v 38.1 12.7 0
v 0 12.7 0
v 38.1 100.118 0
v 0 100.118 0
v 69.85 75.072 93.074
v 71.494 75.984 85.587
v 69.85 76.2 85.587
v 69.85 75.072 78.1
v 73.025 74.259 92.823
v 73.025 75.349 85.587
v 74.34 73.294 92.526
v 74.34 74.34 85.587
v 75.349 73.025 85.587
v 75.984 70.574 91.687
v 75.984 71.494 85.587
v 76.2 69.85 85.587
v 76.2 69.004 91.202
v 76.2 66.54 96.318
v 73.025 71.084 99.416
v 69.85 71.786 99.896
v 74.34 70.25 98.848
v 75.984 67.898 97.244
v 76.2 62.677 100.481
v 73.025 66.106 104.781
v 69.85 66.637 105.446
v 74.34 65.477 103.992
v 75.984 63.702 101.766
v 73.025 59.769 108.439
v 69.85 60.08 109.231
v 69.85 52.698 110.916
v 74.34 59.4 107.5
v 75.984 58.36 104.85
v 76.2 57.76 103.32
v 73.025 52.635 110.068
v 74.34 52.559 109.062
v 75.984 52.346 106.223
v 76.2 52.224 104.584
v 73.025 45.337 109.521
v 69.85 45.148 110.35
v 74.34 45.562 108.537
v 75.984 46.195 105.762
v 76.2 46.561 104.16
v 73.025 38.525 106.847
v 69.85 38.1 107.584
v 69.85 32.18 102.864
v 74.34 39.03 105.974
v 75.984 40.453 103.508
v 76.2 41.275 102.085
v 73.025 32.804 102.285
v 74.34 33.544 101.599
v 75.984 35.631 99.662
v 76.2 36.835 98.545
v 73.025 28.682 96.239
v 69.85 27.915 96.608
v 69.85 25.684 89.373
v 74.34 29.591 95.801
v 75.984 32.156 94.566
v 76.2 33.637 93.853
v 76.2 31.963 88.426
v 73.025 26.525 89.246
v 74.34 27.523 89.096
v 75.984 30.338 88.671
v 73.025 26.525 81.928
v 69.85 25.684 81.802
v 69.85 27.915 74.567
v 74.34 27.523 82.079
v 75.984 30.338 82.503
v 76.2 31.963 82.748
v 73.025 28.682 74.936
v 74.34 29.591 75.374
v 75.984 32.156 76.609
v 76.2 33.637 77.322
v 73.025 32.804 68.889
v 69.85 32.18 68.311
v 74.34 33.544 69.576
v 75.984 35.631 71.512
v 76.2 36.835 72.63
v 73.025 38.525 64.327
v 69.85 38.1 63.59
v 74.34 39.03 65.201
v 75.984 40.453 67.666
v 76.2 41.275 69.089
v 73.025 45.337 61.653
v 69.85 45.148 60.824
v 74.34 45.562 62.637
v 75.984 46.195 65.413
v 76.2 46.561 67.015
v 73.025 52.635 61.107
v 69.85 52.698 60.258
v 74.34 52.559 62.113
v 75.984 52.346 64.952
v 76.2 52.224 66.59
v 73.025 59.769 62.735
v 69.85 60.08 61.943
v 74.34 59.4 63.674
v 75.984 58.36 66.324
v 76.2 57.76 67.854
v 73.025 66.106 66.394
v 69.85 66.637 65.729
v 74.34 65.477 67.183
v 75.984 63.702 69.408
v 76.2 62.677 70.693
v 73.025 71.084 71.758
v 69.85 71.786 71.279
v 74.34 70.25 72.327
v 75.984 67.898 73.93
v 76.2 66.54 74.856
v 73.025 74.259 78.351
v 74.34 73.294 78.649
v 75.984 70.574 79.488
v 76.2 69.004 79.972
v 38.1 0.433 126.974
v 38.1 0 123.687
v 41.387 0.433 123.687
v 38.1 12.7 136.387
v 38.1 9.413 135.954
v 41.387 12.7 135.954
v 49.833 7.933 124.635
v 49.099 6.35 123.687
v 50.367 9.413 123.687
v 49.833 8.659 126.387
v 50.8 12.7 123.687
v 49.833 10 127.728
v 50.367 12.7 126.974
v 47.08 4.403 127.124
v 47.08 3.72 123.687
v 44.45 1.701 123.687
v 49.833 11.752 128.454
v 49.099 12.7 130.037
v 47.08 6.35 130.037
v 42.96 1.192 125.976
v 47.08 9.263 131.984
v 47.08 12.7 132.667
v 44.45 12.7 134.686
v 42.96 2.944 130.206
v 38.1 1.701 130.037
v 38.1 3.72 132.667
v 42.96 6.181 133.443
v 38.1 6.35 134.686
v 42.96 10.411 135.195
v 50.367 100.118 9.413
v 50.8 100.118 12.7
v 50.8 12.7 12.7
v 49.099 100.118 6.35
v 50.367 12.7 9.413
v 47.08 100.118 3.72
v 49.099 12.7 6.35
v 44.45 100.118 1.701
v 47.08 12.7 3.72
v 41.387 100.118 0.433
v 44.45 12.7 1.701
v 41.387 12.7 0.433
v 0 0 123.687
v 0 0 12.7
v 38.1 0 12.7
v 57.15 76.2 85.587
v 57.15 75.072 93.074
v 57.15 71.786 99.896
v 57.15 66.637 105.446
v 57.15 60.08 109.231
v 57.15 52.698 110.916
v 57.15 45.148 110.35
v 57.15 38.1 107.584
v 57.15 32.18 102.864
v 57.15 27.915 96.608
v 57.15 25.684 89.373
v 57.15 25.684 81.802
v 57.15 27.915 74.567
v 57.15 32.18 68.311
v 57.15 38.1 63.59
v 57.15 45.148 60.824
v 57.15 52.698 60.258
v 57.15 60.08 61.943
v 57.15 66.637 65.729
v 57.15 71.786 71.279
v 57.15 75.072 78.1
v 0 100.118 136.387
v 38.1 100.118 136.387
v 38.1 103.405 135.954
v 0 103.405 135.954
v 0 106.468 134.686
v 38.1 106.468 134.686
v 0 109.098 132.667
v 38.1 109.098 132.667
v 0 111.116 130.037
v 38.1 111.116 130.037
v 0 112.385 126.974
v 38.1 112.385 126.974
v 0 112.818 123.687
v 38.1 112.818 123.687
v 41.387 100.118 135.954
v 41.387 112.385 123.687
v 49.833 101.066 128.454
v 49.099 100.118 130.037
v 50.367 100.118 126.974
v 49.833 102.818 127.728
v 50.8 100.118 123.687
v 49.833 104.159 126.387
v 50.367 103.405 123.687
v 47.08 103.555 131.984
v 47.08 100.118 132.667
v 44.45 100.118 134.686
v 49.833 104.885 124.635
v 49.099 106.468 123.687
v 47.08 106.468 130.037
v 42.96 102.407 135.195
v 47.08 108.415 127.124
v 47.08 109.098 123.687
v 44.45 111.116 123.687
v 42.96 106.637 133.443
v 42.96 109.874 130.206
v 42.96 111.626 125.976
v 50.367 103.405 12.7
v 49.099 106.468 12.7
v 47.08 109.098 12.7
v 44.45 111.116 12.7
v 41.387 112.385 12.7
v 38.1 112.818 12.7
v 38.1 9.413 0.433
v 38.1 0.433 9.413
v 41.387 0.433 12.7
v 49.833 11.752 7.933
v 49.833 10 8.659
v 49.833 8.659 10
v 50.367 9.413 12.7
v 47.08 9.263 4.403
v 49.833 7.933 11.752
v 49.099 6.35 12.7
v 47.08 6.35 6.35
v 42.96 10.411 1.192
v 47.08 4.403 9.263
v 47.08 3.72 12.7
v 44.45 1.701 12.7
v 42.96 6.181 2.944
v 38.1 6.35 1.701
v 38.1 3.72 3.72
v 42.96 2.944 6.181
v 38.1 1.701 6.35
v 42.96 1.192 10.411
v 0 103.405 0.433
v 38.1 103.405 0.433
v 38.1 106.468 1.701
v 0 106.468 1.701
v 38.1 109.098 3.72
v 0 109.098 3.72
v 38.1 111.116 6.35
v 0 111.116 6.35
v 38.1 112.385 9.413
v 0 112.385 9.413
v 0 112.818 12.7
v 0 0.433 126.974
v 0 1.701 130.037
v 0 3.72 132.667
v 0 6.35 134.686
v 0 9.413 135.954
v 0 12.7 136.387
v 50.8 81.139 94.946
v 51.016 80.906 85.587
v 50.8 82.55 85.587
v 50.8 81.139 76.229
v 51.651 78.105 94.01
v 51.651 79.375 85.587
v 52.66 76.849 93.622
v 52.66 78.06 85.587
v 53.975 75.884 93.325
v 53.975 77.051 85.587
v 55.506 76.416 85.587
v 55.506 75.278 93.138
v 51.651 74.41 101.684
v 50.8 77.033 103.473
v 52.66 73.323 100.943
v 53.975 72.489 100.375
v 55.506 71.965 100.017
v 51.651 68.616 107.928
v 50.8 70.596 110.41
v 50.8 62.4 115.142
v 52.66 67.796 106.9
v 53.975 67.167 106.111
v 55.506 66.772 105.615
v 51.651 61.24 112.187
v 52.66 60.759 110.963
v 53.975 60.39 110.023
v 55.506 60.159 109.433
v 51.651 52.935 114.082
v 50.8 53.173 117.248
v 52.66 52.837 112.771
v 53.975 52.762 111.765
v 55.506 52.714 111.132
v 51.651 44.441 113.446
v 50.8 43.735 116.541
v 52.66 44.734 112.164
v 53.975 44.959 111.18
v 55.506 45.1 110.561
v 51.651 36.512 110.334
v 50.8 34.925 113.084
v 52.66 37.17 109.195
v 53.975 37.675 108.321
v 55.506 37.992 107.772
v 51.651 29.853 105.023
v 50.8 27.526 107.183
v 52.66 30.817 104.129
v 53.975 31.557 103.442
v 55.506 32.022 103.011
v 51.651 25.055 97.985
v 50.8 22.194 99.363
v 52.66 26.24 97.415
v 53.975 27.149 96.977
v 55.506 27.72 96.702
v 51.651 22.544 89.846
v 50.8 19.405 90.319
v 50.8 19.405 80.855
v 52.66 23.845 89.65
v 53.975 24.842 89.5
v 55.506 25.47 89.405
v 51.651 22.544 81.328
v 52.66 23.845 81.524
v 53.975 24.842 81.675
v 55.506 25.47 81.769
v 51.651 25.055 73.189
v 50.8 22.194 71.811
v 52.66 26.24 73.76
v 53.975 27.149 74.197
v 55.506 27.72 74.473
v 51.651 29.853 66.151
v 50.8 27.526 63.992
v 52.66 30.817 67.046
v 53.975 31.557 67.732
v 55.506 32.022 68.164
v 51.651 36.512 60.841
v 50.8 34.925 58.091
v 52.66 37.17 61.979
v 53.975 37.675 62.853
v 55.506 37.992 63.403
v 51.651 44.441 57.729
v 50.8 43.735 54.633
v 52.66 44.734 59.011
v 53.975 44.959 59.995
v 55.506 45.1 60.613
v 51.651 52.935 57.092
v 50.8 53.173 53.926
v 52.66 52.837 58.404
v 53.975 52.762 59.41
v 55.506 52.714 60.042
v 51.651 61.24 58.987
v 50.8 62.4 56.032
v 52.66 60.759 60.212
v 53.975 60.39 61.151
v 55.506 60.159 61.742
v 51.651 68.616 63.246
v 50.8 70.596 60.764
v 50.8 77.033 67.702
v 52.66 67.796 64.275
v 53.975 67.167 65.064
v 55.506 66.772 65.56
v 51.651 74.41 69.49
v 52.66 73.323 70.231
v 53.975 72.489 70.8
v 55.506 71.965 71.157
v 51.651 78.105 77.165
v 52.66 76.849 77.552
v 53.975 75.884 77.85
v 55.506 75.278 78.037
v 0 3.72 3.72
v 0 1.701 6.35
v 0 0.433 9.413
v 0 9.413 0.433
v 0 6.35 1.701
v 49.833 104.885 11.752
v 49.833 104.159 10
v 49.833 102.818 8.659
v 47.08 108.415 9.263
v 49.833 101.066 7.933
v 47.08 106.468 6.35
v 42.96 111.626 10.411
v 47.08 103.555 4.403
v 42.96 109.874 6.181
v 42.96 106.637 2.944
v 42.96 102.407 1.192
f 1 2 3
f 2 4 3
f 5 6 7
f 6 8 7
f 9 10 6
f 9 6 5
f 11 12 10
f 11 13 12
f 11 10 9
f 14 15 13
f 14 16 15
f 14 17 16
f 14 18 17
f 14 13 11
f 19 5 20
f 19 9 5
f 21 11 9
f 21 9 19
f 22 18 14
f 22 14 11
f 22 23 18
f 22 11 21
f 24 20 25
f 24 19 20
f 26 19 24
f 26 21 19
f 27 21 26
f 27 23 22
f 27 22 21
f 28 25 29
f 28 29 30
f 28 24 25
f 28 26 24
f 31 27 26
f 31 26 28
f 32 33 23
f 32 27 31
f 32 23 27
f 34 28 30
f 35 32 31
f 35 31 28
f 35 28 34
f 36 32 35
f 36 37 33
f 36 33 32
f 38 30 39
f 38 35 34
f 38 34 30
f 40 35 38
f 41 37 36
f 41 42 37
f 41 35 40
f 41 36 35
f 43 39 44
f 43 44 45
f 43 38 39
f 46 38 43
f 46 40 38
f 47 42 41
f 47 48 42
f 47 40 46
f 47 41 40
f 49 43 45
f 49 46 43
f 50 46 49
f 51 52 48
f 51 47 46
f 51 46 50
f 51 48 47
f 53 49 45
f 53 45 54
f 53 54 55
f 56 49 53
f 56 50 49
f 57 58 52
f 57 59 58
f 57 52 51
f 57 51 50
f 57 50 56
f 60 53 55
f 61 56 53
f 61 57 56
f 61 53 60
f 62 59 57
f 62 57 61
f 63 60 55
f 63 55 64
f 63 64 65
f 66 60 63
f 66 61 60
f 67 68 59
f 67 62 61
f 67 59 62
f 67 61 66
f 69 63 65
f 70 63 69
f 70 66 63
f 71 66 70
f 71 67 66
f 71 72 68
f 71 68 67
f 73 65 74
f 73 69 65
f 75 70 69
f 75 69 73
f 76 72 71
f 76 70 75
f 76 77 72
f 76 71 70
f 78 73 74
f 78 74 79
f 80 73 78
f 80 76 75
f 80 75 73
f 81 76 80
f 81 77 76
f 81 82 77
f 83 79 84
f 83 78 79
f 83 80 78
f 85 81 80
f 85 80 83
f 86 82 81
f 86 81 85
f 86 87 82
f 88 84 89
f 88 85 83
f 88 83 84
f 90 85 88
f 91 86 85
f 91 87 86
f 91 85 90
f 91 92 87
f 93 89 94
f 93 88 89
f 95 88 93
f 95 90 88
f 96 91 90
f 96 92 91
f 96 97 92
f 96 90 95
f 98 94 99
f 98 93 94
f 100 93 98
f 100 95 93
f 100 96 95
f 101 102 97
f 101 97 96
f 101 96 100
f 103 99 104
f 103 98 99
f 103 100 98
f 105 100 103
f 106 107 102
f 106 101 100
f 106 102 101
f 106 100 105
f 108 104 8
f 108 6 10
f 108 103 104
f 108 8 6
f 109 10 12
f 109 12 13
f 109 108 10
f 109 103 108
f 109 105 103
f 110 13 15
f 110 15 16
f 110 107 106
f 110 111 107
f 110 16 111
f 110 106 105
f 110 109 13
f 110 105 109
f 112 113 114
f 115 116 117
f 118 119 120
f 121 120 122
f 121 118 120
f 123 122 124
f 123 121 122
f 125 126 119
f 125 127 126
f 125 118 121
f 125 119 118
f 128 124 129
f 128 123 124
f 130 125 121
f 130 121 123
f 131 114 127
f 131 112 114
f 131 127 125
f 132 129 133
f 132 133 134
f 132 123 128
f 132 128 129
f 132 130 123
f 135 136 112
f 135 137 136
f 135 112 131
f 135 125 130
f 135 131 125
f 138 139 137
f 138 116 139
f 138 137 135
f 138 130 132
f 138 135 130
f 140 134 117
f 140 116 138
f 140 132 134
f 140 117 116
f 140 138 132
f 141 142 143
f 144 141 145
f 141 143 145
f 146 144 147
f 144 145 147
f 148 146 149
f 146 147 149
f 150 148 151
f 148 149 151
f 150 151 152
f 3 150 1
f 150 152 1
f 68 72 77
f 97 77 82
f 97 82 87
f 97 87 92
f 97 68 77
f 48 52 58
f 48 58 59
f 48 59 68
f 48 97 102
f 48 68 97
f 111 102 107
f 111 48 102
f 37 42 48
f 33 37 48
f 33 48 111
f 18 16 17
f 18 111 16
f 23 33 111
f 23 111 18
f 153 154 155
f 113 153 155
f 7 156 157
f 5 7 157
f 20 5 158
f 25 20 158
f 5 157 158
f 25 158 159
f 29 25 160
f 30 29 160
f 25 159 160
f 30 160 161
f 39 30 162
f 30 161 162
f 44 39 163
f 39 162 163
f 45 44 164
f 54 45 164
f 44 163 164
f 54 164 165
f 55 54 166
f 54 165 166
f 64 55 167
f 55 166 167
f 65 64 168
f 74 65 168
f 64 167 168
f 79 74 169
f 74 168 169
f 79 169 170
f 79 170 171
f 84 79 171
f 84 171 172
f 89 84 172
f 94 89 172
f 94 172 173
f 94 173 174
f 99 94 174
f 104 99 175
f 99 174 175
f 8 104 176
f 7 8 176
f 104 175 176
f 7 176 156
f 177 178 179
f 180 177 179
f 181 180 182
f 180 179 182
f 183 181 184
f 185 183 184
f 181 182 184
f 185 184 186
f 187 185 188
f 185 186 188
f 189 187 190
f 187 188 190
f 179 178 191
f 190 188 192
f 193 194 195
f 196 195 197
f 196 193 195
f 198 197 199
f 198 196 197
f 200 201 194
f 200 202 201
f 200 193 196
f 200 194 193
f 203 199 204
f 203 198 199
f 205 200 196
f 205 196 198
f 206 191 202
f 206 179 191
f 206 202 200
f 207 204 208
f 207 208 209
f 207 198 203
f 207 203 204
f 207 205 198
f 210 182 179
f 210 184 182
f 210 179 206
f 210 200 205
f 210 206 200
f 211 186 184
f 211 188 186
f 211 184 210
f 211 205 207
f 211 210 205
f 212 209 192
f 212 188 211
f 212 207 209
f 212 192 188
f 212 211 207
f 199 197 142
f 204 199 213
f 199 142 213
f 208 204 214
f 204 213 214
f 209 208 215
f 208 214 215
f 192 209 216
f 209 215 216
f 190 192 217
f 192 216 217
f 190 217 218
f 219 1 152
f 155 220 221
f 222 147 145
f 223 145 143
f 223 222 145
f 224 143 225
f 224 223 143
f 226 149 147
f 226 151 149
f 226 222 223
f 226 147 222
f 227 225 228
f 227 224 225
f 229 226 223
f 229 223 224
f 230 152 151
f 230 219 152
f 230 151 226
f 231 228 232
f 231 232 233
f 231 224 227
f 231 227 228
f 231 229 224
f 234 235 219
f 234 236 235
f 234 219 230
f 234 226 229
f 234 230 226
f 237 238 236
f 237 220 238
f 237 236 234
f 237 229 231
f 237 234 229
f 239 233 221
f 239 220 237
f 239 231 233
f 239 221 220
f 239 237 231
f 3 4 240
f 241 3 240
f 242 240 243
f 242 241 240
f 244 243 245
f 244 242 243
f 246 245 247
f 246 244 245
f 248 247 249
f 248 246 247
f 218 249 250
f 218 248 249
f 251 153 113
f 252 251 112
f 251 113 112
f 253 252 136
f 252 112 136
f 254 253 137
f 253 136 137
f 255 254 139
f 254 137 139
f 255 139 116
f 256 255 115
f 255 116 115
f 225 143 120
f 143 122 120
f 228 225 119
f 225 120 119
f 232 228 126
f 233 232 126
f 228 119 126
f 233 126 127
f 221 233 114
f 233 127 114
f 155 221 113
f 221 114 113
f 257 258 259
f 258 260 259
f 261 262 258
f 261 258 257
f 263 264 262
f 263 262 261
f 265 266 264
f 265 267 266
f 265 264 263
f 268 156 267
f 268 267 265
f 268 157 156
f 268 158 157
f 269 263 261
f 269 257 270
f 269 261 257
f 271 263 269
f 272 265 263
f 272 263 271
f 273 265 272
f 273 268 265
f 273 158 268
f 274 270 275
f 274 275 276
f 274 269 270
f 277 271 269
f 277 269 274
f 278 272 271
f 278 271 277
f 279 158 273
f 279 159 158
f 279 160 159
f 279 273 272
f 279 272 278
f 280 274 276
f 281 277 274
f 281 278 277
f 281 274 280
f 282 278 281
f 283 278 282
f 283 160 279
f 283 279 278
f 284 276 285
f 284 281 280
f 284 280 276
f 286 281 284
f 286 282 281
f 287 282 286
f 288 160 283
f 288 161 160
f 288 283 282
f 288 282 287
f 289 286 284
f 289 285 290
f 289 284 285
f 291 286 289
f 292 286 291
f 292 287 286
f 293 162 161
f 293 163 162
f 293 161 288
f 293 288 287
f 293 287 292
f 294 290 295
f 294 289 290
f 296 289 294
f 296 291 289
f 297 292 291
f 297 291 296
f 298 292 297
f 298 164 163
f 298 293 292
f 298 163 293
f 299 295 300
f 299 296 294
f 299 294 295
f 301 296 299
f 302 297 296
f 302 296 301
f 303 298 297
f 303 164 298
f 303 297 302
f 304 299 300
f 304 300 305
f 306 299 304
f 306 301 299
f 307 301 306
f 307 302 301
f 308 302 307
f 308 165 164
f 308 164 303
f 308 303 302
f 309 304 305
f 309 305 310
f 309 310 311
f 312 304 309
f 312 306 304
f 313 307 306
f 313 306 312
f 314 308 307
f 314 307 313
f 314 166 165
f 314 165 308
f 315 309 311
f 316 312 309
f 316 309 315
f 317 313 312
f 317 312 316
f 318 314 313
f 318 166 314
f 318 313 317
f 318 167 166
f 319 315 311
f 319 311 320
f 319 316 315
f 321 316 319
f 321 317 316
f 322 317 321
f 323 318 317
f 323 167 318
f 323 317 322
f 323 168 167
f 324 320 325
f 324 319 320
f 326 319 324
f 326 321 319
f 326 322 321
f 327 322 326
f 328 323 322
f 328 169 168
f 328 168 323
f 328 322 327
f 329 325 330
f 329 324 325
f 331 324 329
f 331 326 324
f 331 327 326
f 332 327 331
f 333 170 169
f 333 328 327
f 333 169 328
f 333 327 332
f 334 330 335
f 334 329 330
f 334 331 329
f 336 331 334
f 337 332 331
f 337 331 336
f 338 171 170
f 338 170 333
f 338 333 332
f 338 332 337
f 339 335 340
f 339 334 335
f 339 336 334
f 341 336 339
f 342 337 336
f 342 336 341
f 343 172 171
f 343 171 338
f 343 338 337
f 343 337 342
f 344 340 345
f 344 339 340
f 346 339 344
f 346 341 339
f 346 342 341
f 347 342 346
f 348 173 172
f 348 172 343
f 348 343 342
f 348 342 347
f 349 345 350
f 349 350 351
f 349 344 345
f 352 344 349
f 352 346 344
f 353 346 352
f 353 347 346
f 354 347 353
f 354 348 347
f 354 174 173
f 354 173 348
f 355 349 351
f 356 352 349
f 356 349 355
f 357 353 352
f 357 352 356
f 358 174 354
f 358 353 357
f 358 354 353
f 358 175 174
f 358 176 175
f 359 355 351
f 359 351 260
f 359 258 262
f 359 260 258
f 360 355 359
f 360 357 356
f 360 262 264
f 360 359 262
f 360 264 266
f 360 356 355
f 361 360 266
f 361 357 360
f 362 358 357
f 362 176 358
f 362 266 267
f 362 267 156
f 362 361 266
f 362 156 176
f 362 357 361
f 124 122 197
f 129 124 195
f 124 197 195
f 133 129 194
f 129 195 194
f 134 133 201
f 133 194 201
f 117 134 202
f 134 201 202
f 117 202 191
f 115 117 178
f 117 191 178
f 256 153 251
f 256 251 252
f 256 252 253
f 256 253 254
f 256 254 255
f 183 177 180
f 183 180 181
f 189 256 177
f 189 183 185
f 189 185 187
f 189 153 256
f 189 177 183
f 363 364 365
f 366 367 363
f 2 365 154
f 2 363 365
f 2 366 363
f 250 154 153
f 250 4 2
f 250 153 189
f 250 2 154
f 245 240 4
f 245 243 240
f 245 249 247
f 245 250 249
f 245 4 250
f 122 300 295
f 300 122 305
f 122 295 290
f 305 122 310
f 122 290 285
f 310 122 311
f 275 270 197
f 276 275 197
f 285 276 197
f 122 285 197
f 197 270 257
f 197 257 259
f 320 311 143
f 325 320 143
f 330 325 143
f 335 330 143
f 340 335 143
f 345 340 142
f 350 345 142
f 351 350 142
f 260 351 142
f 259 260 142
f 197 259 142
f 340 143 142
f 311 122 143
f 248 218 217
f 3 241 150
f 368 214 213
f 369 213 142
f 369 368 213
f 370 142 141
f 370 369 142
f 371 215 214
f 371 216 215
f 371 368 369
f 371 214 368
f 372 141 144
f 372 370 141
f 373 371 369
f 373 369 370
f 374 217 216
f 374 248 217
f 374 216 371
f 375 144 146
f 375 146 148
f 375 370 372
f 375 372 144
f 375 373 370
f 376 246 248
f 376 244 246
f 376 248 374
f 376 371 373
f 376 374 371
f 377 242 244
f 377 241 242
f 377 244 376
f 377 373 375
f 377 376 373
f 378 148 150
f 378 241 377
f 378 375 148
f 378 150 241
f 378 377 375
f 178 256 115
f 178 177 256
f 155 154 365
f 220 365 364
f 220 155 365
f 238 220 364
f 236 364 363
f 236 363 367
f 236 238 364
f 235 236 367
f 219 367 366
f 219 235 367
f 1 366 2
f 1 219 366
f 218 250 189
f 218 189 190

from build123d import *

# Parameters (mm, degrees)
F0_W     = 50.8
F0_H     = 112.817927
F1_DEPTH = 136.387214
F2_R     = 25.4
F3_DEPTH = 25.4
F4_R     = 6.35
F5_R     = 12.7
F6_R     = 12.7


with BuildPart() as f1:
    # F0 (on Top) → F1 (new body)
    with BuildSketch(Plane.XY):
        with Locations((25.4, 56.408963)):
            Rectangle(F0_W, F0_H)
    extrude(amount=F1_DEPTH)

    # F2 (on face) → F3 (join)
    with BuildSketch(Plane.YZ.offset(50.8)):
        with Locations((50.8, 85.587214)):
            Circle(F2_R)
    extrude(amount=F3_DEPTH)

    # F4
    f4_edges = [f1.edges().sort_by_distance(p)[0] for p in [
        (76.2, 25.4, 85.587214),
        (50.8, 25.4, 85.587214),
    ]]
    fillet(f4_edges, radius=F4_R)

    # F5
    f5_edges = [f1.edges().sort_by_distance(p)[0] for p in [
        (25.4, 112.817927, 136.387214),
        (25.4, 112.817927, 0),
        (25.4, 0, 0),
        (25.4, 0, 136.387214),
    ]]
    fillet(f5_edges, radius=F5_R)

    # F6
    f6_edges = [f1.edges().sort_by_distance(p)[0] for p in [
        (50.8, 0, 68.193607),
    ]]
    fillet(f6_edges, radius=F6_R)


solid = f1.part
